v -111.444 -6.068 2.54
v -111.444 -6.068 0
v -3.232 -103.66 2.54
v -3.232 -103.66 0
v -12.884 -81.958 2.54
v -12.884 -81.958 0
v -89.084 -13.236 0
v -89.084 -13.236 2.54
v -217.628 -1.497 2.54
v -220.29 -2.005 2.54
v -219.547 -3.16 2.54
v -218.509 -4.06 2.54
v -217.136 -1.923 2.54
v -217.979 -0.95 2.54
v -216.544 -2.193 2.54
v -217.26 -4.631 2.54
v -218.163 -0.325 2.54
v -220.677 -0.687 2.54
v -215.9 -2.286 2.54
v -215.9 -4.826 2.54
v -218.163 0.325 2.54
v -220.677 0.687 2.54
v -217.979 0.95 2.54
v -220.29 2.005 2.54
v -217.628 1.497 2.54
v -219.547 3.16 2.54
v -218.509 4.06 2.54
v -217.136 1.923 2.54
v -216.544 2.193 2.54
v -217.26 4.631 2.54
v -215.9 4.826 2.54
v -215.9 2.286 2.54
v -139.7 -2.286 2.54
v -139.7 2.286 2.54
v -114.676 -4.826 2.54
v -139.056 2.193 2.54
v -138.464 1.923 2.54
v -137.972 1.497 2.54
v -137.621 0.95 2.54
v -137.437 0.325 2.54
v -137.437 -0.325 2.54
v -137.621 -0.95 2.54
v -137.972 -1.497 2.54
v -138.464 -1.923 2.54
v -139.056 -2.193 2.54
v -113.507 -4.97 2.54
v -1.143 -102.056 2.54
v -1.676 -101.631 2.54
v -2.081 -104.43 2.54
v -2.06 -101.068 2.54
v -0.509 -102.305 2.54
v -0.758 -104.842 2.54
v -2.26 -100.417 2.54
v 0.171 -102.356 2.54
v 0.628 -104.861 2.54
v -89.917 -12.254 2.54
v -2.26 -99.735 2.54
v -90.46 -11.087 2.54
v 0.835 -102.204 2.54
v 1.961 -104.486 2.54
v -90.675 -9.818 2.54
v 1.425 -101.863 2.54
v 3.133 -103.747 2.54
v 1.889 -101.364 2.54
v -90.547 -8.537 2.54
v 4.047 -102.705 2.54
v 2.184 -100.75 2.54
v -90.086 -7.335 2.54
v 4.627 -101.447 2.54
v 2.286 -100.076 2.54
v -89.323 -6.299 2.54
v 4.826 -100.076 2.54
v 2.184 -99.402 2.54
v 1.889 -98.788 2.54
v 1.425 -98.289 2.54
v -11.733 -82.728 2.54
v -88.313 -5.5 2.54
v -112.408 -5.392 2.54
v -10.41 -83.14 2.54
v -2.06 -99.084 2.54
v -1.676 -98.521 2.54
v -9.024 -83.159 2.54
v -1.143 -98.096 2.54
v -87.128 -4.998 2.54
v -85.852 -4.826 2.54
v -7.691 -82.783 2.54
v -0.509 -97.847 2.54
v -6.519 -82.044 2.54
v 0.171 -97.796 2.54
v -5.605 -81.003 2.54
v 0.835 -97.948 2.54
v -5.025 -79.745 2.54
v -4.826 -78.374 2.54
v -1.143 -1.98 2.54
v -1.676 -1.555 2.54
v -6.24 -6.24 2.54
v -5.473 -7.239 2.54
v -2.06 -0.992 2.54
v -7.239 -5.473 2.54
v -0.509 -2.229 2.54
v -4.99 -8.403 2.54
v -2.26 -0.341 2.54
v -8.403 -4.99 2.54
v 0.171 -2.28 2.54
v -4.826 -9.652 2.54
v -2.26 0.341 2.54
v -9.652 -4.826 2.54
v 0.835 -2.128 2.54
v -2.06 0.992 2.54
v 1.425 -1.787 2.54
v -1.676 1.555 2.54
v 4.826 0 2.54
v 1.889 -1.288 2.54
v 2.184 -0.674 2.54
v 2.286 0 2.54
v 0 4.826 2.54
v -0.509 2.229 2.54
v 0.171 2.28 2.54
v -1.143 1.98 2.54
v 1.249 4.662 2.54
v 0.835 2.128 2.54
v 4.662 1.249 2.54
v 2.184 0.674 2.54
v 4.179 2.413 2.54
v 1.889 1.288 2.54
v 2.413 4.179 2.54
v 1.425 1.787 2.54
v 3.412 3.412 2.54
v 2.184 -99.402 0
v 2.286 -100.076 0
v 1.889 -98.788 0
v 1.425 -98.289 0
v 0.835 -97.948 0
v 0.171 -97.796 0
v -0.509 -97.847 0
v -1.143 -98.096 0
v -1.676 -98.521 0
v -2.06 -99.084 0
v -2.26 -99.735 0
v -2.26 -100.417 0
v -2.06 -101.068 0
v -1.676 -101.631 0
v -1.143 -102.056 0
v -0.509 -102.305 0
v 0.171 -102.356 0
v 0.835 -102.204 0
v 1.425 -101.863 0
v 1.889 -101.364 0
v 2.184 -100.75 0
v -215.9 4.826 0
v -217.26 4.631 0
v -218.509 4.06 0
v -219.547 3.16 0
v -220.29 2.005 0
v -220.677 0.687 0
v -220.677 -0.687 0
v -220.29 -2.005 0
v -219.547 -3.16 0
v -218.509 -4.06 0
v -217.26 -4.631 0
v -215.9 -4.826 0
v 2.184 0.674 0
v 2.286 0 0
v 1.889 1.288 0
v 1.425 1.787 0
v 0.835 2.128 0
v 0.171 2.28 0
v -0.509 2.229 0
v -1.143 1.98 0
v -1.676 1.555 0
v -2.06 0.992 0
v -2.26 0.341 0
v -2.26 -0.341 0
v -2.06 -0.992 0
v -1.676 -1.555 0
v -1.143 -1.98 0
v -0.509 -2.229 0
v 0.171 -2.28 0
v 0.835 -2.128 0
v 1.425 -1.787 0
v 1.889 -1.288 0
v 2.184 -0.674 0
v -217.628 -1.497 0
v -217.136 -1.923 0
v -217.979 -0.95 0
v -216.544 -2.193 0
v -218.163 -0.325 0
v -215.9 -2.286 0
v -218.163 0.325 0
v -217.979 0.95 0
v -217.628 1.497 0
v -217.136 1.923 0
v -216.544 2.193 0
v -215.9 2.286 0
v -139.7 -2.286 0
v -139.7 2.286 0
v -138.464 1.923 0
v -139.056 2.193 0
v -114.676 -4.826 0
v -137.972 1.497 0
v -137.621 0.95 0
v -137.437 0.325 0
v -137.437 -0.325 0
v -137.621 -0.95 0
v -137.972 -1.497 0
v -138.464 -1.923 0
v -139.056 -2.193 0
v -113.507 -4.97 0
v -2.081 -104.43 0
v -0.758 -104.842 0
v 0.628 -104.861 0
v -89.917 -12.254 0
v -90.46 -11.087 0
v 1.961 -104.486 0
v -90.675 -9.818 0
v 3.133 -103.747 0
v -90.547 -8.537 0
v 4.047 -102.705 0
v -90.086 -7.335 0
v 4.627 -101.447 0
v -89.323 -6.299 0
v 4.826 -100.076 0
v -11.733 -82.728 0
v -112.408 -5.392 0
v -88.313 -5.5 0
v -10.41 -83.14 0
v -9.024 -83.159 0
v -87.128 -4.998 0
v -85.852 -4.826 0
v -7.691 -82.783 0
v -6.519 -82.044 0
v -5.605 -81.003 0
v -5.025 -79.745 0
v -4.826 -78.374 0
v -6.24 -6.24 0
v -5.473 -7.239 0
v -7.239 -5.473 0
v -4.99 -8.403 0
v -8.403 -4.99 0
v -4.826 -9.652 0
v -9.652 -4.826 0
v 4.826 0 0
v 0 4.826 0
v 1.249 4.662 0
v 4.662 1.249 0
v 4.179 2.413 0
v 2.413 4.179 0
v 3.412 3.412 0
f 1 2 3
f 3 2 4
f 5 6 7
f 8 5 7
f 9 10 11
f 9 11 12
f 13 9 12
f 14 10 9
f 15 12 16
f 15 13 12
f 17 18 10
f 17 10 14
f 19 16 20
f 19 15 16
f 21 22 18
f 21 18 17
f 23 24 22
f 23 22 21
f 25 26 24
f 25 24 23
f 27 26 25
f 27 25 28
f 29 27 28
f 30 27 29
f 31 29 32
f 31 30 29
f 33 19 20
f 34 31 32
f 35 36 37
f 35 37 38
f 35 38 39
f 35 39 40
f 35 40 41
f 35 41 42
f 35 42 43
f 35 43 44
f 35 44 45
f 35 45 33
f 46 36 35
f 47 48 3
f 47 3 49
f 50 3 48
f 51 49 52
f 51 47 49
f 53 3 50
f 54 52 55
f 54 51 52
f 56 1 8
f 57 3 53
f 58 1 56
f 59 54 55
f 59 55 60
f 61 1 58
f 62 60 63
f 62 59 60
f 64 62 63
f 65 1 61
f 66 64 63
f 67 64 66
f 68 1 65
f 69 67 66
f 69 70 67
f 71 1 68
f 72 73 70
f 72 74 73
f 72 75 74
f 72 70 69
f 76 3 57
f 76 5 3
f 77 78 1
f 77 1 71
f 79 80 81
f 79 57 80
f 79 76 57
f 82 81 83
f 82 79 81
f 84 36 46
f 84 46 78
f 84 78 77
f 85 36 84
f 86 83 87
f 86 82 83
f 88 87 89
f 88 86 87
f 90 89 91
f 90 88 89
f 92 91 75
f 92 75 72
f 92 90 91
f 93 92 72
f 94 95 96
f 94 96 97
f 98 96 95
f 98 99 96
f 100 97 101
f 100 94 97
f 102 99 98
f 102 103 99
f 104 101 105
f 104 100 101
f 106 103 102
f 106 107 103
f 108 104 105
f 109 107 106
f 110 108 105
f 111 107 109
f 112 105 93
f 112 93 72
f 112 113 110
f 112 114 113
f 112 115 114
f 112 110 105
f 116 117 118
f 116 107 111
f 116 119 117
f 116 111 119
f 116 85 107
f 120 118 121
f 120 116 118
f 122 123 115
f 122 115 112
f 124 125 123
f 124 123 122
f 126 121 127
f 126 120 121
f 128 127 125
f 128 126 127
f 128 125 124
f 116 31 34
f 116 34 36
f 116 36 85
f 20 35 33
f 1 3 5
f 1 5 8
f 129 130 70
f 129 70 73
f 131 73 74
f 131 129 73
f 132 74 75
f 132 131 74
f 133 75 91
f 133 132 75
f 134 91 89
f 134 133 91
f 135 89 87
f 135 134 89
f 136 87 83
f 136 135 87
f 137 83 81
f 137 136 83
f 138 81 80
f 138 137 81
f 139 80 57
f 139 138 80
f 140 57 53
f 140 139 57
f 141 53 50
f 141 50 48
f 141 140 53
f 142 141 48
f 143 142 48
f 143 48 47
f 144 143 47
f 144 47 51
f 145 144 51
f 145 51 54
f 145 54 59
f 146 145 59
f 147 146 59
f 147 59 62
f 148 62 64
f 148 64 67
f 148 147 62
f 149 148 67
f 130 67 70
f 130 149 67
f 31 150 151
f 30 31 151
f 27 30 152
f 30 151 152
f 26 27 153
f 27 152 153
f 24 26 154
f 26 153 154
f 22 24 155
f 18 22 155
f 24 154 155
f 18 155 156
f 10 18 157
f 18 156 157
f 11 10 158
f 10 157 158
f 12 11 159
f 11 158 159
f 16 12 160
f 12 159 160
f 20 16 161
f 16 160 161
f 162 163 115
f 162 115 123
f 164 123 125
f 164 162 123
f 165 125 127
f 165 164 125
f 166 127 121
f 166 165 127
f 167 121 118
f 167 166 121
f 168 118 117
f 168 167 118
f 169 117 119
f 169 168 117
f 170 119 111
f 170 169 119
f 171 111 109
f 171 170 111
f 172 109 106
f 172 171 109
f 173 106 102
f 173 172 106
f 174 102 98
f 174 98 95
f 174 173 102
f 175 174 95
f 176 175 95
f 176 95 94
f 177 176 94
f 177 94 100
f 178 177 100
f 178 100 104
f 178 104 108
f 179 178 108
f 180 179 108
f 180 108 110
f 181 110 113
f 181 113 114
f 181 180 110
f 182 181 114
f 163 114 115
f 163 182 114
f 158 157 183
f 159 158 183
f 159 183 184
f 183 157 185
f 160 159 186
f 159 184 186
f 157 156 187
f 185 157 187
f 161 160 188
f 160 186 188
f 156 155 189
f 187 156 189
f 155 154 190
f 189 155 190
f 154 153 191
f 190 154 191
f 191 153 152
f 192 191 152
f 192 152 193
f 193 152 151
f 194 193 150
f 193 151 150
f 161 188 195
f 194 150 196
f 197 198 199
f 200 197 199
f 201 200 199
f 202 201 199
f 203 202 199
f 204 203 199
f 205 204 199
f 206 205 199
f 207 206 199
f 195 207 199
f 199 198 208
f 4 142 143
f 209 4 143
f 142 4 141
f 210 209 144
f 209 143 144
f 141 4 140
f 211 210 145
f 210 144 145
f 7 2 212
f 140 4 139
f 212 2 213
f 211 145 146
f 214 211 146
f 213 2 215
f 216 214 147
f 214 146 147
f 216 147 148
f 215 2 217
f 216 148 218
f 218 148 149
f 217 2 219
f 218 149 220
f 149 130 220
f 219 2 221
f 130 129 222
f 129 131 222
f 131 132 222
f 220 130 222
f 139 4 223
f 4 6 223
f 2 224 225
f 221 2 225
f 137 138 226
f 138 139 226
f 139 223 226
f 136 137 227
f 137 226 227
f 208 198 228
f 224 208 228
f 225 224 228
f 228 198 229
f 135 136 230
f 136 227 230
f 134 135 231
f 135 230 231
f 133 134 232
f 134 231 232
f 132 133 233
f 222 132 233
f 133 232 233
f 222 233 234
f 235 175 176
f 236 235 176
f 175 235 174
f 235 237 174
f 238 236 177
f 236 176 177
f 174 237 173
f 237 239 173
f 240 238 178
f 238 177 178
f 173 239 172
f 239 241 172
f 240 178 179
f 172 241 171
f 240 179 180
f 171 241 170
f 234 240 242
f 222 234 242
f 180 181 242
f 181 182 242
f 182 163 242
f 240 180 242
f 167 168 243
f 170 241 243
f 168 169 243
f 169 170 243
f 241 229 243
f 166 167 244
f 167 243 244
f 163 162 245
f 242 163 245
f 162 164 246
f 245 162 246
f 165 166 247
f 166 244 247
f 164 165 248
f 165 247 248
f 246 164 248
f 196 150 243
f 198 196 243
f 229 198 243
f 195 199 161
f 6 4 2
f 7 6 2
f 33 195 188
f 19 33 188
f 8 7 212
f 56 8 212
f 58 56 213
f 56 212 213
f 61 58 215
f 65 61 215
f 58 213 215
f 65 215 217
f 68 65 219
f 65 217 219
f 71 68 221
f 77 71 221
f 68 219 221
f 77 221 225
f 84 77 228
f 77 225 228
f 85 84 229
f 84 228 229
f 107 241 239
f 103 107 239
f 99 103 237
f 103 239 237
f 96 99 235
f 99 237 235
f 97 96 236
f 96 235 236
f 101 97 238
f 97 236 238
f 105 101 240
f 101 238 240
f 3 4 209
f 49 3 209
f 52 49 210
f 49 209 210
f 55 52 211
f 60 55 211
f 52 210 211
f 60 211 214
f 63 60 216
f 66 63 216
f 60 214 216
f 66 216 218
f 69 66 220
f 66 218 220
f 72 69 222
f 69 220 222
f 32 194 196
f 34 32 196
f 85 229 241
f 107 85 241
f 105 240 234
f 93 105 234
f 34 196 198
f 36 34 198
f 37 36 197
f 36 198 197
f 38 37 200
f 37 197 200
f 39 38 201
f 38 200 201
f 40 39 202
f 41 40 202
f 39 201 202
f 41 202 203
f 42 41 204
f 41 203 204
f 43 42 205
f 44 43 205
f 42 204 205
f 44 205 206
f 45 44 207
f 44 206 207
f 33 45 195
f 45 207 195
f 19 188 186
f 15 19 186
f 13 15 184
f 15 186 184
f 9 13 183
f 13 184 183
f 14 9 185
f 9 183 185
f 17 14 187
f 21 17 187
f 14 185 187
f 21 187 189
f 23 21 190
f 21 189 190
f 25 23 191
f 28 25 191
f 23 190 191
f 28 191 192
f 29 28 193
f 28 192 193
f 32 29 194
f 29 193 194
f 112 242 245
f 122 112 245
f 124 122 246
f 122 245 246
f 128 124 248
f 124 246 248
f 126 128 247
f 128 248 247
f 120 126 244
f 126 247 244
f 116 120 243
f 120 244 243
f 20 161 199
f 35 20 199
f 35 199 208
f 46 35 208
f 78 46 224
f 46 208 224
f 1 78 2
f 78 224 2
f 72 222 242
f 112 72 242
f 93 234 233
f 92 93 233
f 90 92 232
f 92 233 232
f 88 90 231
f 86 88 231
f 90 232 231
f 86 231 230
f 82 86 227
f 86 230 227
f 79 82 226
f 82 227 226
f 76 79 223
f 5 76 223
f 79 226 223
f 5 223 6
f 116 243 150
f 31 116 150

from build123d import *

# Parameters (mm, degrees)
F0_R     = 2.286
F1_DEPTH = 2.54


with BuildPart() as f1:
    # F0 (on Top) → F1 (new body)
    with BuildSketch(Plane.XY):
        with BuildLine():
            Line((0, 4.826), (-215.9, 4.826))
            ThreePointArc((-215.9, 4.826), (-220.726, 0), (-215.9, -4.826))
            Line((-215.9, -4.826), (-114.675652, -4.826))
            ThreePointArc((-114.675652, -4.826), (-112.944357, -5.147236), (-111.443546, -6.06818))
            Line((-111.443546, -6.06818), (-3.232106, -103.65982))
            ThreePointArc((-3.232106, -103.65982), (1.961139, -104.485559), (4.826, -100.076))
            Line((4.826, -100.076), (4.826, 0))
            ThreePointArc((4.826, 0), (3.412497, 3.412497), (0, 4.826))
        make_face()
        with Locations((0, -100.076)):
            Circle(F0_R, mode=Mode.SUBTRACT)
        with BuildLine():
            ThreePointArc((-215.9, -2.286), (-218.186, 0), (-215.9, 2.286))
            Line((-215.9, 2.286), (-139.7, 2.286))
            ThreePointArc((-139.7, 2.286), (-137.414, 0), (-139.7, -2.286))
            Line((-139.7, -2.286), (-215.9, -2.286))
        make_face(mode=Mode.SUBTRACT)
        with BuildLine():
            Line((-12.884106, -81.957602), (-89.084106, -13.23582))
            ThreePointArc((-89.084106, -13.23582), (-90.356764, -7.920706), (-85.852, -4.826))
            Line((-85.852, -4.826), (-9.652, -4.826))
            ThreePointArc((-9.652, -4.826), (-6.239503, -6.239503), (-4.826, -9.652))
            Line((-4.826, -9.652), (-4.826, -78.373782))
            ThreePointArc((-4.826, -78.373782), (-7.690861, -82.783341), (-12.884106, -81.957602))
        make_face(mode=Mode.SUBTRACT)
        Circle(F0_R, mode=Mode.SUBTRACT)
    extrude(amount=F1_DEPTH)


solid = f1.part
